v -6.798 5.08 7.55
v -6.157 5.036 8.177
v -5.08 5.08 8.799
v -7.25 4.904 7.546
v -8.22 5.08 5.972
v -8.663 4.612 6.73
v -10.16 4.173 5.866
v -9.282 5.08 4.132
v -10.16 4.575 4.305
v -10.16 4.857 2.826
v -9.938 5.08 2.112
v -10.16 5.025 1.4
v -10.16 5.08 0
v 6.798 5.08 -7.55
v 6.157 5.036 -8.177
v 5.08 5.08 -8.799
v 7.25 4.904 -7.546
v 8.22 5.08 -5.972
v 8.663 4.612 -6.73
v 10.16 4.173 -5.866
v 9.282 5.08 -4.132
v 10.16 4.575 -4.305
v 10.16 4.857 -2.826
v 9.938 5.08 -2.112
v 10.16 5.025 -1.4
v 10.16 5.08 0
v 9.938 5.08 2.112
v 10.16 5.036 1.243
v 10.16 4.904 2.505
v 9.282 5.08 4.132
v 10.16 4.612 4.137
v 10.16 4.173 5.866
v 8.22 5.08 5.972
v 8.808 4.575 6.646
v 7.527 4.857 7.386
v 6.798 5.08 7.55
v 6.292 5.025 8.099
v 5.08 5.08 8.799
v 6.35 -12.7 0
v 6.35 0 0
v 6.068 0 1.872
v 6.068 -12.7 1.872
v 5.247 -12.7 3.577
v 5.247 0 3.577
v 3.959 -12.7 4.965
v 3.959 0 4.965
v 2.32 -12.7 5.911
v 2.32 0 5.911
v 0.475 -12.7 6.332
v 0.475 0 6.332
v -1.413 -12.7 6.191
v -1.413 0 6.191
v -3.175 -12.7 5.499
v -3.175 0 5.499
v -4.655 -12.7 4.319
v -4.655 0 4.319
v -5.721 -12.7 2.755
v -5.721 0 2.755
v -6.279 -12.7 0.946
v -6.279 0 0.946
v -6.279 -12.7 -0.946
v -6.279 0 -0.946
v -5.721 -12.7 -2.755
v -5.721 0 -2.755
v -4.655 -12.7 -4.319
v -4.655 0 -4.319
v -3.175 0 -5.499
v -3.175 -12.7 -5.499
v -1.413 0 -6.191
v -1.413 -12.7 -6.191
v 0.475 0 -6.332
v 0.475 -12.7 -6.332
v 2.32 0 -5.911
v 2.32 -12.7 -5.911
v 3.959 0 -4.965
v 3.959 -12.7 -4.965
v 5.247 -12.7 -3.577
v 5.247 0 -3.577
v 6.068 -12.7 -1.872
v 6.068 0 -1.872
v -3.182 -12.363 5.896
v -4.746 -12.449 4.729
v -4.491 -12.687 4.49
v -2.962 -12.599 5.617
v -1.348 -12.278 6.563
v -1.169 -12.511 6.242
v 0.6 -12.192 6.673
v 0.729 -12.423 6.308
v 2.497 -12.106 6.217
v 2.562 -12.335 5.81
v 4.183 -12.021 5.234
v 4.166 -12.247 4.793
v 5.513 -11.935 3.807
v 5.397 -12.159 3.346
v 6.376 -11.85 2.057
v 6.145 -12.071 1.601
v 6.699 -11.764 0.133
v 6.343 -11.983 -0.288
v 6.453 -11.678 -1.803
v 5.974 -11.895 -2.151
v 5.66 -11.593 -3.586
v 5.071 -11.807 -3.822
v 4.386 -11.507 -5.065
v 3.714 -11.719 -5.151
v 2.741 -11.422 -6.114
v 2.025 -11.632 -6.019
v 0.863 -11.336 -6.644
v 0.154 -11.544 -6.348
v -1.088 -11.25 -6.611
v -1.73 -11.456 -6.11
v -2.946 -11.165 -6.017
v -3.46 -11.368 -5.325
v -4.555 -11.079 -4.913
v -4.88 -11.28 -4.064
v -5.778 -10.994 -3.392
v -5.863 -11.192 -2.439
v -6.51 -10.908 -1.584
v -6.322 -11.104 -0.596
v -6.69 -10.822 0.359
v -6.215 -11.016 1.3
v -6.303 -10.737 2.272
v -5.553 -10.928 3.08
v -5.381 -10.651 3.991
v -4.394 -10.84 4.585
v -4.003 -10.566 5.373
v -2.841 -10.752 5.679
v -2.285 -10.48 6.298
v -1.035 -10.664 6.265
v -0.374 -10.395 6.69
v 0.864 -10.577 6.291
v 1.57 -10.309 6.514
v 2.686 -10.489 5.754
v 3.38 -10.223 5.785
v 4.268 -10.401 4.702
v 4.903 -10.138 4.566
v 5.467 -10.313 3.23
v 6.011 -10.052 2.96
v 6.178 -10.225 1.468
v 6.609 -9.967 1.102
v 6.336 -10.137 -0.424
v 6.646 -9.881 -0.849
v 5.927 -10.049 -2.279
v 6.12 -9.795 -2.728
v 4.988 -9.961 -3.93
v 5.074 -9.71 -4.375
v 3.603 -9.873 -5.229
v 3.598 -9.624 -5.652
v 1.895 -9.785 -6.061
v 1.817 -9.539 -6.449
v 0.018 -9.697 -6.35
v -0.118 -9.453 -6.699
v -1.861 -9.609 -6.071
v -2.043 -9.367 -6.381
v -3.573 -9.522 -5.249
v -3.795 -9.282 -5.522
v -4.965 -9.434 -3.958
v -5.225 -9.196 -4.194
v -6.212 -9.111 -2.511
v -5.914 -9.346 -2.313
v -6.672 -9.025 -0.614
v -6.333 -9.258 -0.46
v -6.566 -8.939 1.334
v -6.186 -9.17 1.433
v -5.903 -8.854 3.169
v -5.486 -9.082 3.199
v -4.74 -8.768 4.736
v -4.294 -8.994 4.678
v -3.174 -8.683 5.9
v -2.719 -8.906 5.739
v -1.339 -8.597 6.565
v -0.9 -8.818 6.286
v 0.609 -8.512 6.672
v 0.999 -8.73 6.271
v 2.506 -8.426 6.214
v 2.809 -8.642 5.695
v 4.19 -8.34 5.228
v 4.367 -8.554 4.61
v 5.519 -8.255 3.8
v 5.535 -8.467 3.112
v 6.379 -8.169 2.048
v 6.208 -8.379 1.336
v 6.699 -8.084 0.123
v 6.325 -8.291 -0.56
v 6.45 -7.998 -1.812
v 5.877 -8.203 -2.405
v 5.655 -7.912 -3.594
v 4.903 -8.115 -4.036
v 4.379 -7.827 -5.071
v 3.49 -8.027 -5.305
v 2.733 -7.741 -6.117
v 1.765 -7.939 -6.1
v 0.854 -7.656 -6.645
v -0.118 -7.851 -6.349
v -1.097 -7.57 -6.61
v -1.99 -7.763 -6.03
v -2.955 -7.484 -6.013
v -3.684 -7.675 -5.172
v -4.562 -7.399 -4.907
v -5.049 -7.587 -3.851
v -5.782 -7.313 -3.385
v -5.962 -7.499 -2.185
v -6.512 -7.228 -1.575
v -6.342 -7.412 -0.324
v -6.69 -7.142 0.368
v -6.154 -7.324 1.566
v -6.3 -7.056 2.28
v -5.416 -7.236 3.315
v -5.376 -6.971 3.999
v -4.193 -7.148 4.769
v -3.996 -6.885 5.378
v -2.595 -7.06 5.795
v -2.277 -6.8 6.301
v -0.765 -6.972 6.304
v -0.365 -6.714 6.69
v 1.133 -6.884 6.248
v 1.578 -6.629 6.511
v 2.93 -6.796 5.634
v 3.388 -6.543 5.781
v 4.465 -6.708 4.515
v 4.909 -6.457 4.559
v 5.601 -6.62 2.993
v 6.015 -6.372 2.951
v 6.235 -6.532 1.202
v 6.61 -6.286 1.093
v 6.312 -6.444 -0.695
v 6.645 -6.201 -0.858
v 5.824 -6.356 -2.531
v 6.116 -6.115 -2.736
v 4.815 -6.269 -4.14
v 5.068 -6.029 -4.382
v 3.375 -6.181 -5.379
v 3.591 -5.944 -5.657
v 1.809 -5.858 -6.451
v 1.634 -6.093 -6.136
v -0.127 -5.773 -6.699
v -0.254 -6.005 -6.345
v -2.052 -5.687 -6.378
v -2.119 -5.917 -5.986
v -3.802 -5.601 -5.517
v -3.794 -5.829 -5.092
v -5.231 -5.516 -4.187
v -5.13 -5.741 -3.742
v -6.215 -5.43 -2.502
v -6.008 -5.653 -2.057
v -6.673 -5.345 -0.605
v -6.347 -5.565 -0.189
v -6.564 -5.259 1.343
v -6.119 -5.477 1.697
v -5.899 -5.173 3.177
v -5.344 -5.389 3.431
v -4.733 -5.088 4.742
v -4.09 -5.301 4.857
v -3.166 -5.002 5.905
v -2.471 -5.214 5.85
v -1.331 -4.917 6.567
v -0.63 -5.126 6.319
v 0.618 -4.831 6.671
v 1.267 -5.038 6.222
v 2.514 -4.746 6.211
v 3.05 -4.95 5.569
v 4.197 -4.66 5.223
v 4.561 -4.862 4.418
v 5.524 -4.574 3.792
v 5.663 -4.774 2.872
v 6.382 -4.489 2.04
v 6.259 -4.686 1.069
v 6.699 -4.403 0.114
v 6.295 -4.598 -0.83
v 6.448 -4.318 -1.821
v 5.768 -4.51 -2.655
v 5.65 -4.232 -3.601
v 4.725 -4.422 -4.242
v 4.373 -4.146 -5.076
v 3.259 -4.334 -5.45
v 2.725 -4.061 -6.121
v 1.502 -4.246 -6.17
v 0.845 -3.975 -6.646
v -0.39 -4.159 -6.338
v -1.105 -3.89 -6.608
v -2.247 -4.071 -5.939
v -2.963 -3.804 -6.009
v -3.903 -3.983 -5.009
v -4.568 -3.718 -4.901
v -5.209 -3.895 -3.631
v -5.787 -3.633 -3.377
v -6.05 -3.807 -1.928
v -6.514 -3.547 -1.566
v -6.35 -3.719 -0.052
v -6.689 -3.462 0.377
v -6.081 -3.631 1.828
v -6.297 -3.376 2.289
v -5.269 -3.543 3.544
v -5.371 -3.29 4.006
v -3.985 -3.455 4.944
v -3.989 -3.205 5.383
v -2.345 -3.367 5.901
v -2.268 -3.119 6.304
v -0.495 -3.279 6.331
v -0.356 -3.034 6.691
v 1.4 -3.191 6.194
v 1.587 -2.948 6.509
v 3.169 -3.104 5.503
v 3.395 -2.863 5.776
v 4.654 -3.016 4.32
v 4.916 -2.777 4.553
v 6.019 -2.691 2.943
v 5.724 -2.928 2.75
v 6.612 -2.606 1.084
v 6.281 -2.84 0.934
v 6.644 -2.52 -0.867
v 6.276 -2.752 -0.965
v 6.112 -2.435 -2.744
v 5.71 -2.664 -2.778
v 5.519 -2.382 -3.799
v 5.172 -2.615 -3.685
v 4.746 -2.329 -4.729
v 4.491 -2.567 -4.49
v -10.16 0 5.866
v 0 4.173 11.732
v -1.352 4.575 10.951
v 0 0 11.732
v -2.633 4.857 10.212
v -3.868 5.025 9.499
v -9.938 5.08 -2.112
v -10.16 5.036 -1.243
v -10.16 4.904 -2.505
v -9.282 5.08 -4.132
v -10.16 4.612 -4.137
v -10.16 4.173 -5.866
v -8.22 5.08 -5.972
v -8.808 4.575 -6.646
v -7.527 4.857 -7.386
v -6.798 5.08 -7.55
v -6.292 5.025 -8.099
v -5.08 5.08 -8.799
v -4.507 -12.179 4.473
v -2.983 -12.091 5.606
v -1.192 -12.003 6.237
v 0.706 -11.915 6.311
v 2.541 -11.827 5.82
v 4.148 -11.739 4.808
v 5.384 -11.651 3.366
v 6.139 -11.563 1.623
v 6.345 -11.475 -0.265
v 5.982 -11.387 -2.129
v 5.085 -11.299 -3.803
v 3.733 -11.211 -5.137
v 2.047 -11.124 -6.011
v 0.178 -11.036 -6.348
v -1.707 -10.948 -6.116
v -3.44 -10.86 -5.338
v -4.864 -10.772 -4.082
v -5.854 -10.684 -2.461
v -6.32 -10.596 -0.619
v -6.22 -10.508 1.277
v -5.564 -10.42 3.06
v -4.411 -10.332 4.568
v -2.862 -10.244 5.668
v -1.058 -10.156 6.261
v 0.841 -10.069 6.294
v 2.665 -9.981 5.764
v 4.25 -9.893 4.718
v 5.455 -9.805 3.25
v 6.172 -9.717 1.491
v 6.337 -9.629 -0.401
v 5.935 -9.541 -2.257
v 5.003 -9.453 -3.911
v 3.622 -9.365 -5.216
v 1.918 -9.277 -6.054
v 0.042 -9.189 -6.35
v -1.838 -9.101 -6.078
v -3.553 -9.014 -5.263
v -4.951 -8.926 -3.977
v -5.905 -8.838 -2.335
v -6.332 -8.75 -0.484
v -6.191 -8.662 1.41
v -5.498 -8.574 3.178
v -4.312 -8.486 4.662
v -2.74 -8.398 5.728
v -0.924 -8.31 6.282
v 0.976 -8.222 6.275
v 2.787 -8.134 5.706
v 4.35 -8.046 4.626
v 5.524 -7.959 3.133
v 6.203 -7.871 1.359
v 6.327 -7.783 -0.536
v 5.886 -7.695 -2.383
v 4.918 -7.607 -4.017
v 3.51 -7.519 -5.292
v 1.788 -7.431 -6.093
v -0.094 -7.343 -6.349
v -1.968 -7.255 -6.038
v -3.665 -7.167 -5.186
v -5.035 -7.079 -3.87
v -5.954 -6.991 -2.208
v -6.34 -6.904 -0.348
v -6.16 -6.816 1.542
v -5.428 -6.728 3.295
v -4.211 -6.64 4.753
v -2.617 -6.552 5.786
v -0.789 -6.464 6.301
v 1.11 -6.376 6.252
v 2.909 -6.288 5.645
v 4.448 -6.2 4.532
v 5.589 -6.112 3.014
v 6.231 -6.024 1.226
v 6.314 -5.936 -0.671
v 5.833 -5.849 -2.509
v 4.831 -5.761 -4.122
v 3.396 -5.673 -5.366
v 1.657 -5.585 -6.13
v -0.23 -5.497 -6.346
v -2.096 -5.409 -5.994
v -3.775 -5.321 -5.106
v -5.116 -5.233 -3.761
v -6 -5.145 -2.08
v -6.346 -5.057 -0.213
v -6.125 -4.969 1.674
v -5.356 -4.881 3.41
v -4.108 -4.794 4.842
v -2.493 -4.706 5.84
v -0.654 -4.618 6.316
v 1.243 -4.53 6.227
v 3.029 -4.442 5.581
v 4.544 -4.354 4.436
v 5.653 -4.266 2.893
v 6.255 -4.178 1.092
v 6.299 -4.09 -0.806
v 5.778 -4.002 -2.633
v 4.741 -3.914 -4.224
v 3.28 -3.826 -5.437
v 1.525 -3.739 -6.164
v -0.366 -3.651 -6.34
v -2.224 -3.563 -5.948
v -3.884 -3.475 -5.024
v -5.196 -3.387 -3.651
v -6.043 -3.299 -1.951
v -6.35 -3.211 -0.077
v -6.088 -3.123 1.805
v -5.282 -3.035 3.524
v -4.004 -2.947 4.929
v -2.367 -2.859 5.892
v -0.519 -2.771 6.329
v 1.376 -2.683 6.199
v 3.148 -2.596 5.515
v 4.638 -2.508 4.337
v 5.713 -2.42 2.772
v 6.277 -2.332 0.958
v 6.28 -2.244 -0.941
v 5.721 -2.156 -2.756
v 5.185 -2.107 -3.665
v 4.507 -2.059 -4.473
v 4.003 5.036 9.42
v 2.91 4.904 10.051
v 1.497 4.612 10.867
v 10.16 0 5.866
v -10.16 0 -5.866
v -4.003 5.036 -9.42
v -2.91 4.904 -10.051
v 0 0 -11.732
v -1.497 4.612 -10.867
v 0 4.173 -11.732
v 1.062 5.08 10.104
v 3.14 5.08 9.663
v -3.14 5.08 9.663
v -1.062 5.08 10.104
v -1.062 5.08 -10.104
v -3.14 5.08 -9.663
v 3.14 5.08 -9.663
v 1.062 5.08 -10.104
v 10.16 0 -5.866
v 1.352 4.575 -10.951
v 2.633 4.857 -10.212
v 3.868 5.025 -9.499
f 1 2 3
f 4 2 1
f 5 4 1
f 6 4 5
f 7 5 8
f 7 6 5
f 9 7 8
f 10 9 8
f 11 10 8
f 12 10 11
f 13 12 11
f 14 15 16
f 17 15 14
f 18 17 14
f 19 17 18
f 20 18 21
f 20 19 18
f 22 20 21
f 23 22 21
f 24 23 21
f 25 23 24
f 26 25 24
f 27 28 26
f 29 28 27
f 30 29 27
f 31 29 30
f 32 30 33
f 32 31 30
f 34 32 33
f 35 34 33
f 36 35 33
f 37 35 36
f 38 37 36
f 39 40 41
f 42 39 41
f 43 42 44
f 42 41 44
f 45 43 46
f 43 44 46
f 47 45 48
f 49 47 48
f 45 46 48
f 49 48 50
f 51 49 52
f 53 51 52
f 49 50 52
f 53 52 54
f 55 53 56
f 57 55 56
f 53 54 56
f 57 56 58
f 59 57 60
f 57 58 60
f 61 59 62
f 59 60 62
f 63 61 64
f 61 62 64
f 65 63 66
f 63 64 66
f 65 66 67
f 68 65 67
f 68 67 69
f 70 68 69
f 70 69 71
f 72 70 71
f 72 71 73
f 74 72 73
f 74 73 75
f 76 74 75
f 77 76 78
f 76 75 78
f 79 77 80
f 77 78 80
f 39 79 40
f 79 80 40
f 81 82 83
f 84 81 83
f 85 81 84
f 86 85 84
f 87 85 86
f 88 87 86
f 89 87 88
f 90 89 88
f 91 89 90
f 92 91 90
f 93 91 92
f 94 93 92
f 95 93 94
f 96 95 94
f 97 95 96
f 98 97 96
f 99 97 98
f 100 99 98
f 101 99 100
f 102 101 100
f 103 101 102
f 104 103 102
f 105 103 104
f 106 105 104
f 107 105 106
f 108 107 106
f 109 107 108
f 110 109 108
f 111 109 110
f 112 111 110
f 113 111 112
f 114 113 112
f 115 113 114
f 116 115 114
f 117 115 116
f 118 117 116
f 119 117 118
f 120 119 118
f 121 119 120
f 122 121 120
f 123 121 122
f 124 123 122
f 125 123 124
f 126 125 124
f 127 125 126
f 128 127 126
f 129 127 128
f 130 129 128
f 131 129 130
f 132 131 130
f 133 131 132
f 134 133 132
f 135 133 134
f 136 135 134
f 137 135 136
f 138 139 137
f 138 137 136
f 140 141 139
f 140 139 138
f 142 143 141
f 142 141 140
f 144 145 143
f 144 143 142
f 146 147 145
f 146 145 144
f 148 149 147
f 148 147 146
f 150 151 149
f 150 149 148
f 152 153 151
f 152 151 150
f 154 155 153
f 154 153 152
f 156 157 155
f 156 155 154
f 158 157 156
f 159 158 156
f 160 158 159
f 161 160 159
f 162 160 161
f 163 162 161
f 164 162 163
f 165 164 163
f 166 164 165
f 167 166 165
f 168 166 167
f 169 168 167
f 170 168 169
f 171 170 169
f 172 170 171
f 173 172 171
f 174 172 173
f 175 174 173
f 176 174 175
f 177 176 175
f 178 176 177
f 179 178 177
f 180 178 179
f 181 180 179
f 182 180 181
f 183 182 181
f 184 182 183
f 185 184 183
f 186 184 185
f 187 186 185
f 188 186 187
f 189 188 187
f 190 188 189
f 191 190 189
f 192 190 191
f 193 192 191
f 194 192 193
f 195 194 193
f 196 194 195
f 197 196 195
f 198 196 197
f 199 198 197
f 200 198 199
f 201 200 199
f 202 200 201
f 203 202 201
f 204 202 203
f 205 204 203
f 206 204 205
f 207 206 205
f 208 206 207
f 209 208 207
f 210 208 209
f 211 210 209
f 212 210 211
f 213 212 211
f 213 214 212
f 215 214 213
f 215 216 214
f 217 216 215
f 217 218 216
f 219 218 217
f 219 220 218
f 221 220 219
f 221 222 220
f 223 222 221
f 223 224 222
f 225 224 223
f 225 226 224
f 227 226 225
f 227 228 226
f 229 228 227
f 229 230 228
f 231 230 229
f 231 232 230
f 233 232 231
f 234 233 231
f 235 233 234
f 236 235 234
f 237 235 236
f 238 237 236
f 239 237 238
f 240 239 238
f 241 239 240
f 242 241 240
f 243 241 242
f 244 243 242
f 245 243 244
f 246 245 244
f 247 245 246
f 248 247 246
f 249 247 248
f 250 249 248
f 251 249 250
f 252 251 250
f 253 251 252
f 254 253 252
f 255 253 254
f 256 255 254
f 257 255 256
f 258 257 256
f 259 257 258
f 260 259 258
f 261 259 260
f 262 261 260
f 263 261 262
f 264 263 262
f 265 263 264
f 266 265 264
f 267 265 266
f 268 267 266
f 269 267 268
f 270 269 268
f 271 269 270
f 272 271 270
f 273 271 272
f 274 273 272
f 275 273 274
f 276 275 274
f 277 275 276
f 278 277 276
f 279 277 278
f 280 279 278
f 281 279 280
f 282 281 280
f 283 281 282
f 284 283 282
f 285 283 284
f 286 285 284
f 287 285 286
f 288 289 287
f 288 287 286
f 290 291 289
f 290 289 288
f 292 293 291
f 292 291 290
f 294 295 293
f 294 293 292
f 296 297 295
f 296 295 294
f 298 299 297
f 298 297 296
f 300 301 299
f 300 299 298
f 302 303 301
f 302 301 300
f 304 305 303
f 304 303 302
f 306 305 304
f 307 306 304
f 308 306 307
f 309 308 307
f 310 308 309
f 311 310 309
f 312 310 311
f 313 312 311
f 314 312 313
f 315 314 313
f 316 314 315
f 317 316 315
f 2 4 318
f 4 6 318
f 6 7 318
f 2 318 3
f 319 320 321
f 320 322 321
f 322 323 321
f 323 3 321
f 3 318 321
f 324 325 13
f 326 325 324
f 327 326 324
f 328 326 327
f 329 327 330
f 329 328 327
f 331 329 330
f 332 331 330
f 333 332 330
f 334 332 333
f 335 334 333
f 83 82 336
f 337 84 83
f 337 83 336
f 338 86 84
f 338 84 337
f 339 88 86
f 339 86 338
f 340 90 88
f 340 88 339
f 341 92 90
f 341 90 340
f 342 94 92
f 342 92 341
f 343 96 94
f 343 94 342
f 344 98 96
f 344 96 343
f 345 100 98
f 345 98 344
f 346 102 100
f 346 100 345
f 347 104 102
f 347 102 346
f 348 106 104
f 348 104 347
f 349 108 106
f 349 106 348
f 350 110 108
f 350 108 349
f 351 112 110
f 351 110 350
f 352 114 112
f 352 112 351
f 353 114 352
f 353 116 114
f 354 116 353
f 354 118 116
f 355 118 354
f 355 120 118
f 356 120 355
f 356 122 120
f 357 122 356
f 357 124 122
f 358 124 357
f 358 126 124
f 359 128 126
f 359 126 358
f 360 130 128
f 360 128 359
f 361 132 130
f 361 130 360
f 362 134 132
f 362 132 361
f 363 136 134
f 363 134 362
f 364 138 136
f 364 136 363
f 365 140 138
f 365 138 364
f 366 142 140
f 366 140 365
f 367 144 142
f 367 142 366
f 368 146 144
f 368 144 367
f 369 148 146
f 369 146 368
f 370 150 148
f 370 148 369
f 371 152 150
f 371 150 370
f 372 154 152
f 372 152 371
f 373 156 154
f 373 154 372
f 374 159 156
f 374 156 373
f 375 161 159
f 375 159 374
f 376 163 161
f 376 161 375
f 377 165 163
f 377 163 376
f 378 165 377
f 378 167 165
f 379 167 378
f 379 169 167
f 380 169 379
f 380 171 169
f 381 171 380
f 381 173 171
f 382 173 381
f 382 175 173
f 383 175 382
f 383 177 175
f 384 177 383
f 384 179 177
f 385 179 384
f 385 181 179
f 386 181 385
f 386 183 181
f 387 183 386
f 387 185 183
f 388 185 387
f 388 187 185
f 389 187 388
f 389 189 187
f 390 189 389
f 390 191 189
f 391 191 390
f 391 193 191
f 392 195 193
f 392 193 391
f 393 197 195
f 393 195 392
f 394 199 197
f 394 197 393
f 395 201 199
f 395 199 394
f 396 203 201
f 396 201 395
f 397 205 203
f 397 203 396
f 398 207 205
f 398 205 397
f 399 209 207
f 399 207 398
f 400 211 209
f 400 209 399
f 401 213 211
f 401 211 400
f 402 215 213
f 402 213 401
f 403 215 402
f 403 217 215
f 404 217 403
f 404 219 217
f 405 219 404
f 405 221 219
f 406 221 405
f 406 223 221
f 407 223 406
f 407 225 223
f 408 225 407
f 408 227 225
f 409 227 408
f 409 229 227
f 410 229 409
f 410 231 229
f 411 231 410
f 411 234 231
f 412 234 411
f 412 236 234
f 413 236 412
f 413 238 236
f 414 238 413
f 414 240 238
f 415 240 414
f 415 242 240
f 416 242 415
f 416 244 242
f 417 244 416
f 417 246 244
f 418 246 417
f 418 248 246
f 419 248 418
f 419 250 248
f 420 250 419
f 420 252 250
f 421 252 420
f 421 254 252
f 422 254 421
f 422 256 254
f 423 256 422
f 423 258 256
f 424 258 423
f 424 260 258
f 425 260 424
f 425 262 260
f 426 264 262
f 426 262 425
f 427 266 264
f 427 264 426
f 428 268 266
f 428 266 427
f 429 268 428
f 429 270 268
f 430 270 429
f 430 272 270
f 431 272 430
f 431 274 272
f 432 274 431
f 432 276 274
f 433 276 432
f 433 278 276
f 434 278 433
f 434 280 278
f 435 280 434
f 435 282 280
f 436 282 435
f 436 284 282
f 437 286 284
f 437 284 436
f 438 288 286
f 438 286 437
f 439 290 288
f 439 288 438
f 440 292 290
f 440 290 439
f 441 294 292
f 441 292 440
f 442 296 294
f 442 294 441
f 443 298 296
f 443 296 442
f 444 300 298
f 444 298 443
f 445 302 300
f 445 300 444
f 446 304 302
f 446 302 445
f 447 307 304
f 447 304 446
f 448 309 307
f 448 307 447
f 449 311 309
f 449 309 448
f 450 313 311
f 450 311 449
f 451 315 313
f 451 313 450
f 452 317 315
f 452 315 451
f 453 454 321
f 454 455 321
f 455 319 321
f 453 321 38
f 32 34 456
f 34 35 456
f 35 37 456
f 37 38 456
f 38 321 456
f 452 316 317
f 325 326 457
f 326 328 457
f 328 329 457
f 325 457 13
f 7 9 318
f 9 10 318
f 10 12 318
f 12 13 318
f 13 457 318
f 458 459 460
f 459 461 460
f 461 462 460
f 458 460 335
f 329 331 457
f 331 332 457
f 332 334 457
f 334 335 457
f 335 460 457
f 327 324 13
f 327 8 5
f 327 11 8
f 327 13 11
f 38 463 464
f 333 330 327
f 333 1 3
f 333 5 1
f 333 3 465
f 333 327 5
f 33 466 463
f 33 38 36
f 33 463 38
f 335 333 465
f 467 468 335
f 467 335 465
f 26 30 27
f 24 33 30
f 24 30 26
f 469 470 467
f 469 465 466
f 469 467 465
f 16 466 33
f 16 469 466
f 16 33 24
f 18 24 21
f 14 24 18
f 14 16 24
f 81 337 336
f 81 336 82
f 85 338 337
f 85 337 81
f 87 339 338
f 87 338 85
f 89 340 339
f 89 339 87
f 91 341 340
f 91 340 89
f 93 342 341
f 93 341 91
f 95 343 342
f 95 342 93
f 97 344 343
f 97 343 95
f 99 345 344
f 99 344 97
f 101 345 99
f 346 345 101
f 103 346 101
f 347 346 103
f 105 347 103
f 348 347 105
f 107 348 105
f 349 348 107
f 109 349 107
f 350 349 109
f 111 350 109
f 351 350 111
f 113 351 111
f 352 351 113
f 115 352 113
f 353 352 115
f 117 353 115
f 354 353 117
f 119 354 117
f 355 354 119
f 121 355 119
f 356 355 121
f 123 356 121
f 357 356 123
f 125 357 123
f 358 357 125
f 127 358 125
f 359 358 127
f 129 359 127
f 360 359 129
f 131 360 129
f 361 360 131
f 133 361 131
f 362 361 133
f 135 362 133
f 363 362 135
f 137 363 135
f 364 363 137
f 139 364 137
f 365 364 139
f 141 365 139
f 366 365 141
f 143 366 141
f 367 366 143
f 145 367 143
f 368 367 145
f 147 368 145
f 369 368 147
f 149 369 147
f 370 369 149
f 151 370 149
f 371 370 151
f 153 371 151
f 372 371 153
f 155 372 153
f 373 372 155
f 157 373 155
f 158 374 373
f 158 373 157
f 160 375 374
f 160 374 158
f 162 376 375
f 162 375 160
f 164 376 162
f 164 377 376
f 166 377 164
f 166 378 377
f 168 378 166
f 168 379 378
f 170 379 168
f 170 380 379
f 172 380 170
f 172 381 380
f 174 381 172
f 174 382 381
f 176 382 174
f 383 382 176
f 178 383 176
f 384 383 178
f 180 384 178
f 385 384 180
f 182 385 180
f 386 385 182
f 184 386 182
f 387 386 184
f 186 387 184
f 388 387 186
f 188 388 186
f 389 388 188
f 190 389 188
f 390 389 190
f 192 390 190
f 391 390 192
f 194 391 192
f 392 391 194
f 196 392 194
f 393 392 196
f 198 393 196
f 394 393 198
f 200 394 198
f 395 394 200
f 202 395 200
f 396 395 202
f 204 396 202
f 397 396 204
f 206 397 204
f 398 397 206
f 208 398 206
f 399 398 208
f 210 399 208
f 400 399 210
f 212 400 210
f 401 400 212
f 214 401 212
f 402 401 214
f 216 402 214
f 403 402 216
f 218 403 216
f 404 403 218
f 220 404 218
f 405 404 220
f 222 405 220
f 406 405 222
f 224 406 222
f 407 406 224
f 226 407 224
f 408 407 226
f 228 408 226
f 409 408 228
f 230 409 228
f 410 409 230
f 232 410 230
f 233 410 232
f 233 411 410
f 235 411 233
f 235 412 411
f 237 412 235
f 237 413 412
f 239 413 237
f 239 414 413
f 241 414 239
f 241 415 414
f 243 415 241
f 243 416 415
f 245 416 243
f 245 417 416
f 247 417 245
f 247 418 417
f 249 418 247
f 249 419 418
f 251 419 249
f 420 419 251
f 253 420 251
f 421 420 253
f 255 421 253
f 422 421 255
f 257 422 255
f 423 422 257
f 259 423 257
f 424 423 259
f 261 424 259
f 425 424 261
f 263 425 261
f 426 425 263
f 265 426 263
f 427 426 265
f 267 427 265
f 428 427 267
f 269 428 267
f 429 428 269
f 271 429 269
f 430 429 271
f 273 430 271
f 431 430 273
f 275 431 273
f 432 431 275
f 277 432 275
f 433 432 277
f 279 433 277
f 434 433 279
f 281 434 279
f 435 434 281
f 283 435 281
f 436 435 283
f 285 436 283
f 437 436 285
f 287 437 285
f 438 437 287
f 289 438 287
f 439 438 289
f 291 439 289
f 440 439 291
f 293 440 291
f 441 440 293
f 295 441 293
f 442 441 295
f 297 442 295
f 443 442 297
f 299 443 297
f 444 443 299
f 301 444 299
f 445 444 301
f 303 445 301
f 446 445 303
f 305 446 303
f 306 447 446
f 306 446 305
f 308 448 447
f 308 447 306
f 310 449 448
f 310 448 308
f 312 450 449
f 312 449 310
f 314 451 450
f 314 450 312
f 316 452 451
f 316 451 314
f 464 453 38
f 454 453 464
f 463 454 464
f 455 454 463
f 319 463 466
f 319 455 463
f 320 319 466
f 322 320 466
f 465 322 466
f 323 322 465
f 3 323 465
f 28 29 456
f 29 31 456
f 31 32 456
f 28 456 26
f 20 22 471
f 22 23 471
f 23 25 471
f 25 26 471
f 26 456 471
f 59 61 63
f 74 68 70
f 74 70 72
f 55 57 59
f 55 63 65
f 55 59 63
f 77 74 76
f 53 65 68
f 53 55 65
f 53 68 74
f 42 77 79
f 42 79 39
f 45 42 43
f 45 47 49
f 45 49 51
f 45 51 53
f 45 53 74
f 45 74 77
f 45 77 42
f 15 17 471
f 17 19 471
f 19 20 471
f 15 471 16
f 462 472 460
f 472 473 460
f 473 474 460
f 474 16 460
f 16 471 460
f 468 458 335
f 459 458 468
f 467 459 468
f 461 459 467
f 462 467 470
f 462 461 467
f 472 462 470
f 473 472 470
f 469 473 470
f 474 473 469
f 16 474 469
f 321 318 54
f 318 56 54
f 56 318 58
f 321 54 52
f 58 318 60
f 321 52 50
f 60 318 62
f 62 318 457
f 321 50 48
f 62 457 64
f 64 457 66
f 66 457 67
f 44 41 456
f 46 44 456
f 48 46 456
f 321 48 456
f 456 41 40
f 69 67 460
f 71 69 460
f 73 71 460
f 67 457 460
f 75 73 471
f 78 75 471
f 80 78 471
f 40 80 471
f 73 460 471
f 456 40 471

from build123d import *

# Parameters (mm, degrees)
SALIENTE_EXTRUIR1_DEPTH = 5.08
CROQUIS2_OUTSIDE_W      = 33.01
CROQUIS2_OUTSIDE_H      = 36.154
CROQUIS2_OUTSIDE_R      = 10.16
CORTAR_EXTRUIR1_DEPTH   = 1.27
CORTAR_EXTRUIR1_TAPER   = 60
CROQUIS3_R              = 6.35
SALIENTE_EXTRUIR2_DEPTH = 12.7
BARRER3_PITCH           = 1.84
BARRER3_HEIGHT          = 10.12
BARRER3_RADIUS          = 6.35
BARRER3_START_ANGLE     = -45


with BuildPart() as part:
    # Croquis1 → Saliente-Extruir1 (new body)
    with BuildSketch(Plane(origin=(0, 0, 0), x_dir=(1, 0, 0), z_dir=(0, 1, 0))):
        Polygon((0, 11.73175747), (-10.16, 5.865878735), (-10.16, -5.865878735), (0, -11.73175747), (10.16, -5.865878735), (10.16, 5.865878735), align=None)
    extrude(amount=SALIENTE_EXTRUIR1_DEPTH)

    # Croquis2 outside → Cortar-Extruir1 (cut)
    with BuildSketch(Plane(origin=(0, 5.08, 0), x_dir=(1, 0, 0), z_dir=(0, 1, 0))):
        Rectangle(CROQUIS2_OUTSIDE_W, CROQUIS2_OUTSIDE_H)
        Circle(CROQUIS2_OUTSIDE_R, mode=Mode.SUBTRACT)
    extrude(amount=-CORTAR_EXTRUIR1_DEPTH, taper=CORTAR_EXTRUIR1_TAPER, mode=Mode.SUBTRACT)

    # Croquis3 → Saliente-Extruir2 (add)
    with BuildSketch(Plane.XZ):
        Circle(CROQUIS3_R)
    extrude(amount=SALIENTE_EXTRUIR2_DEPTH)


with BuildPart() as body_2:
    # Barrer3: sweep along a helix
    with BuildLine() as barrer3_path:
        add(Helix(BARRER3_PITCH, BARRER3_HEIGHT, BARRER3_RADIUS, center=(0, -12.7, 0), direction=(0, 1, 0), mode=Mode.PRIVATE).rotate(Axis((0, -12.7, 0), (0, 1, 0)), BARRER3_START_ANGLE))
    # Croquis5 → Barrer3 (sweep)
    with BuildSketch(Plane(origin=(4.490128061, -2.58, -4.490128061), x_dir=(-0.704858529, 0.045970707, 0.707856728), z_dir=(-0.706356038, 0.046068375, -0.706356038))):
        Polygon((0.000618506, 0.013425832), (0.024021241, 0.521425832), (-0.338054001, 0.267425832), align=None)
    sweep(path=barrer3_path.line, is_frenet=True)


solid = Compound([part.part, body_2.part])
